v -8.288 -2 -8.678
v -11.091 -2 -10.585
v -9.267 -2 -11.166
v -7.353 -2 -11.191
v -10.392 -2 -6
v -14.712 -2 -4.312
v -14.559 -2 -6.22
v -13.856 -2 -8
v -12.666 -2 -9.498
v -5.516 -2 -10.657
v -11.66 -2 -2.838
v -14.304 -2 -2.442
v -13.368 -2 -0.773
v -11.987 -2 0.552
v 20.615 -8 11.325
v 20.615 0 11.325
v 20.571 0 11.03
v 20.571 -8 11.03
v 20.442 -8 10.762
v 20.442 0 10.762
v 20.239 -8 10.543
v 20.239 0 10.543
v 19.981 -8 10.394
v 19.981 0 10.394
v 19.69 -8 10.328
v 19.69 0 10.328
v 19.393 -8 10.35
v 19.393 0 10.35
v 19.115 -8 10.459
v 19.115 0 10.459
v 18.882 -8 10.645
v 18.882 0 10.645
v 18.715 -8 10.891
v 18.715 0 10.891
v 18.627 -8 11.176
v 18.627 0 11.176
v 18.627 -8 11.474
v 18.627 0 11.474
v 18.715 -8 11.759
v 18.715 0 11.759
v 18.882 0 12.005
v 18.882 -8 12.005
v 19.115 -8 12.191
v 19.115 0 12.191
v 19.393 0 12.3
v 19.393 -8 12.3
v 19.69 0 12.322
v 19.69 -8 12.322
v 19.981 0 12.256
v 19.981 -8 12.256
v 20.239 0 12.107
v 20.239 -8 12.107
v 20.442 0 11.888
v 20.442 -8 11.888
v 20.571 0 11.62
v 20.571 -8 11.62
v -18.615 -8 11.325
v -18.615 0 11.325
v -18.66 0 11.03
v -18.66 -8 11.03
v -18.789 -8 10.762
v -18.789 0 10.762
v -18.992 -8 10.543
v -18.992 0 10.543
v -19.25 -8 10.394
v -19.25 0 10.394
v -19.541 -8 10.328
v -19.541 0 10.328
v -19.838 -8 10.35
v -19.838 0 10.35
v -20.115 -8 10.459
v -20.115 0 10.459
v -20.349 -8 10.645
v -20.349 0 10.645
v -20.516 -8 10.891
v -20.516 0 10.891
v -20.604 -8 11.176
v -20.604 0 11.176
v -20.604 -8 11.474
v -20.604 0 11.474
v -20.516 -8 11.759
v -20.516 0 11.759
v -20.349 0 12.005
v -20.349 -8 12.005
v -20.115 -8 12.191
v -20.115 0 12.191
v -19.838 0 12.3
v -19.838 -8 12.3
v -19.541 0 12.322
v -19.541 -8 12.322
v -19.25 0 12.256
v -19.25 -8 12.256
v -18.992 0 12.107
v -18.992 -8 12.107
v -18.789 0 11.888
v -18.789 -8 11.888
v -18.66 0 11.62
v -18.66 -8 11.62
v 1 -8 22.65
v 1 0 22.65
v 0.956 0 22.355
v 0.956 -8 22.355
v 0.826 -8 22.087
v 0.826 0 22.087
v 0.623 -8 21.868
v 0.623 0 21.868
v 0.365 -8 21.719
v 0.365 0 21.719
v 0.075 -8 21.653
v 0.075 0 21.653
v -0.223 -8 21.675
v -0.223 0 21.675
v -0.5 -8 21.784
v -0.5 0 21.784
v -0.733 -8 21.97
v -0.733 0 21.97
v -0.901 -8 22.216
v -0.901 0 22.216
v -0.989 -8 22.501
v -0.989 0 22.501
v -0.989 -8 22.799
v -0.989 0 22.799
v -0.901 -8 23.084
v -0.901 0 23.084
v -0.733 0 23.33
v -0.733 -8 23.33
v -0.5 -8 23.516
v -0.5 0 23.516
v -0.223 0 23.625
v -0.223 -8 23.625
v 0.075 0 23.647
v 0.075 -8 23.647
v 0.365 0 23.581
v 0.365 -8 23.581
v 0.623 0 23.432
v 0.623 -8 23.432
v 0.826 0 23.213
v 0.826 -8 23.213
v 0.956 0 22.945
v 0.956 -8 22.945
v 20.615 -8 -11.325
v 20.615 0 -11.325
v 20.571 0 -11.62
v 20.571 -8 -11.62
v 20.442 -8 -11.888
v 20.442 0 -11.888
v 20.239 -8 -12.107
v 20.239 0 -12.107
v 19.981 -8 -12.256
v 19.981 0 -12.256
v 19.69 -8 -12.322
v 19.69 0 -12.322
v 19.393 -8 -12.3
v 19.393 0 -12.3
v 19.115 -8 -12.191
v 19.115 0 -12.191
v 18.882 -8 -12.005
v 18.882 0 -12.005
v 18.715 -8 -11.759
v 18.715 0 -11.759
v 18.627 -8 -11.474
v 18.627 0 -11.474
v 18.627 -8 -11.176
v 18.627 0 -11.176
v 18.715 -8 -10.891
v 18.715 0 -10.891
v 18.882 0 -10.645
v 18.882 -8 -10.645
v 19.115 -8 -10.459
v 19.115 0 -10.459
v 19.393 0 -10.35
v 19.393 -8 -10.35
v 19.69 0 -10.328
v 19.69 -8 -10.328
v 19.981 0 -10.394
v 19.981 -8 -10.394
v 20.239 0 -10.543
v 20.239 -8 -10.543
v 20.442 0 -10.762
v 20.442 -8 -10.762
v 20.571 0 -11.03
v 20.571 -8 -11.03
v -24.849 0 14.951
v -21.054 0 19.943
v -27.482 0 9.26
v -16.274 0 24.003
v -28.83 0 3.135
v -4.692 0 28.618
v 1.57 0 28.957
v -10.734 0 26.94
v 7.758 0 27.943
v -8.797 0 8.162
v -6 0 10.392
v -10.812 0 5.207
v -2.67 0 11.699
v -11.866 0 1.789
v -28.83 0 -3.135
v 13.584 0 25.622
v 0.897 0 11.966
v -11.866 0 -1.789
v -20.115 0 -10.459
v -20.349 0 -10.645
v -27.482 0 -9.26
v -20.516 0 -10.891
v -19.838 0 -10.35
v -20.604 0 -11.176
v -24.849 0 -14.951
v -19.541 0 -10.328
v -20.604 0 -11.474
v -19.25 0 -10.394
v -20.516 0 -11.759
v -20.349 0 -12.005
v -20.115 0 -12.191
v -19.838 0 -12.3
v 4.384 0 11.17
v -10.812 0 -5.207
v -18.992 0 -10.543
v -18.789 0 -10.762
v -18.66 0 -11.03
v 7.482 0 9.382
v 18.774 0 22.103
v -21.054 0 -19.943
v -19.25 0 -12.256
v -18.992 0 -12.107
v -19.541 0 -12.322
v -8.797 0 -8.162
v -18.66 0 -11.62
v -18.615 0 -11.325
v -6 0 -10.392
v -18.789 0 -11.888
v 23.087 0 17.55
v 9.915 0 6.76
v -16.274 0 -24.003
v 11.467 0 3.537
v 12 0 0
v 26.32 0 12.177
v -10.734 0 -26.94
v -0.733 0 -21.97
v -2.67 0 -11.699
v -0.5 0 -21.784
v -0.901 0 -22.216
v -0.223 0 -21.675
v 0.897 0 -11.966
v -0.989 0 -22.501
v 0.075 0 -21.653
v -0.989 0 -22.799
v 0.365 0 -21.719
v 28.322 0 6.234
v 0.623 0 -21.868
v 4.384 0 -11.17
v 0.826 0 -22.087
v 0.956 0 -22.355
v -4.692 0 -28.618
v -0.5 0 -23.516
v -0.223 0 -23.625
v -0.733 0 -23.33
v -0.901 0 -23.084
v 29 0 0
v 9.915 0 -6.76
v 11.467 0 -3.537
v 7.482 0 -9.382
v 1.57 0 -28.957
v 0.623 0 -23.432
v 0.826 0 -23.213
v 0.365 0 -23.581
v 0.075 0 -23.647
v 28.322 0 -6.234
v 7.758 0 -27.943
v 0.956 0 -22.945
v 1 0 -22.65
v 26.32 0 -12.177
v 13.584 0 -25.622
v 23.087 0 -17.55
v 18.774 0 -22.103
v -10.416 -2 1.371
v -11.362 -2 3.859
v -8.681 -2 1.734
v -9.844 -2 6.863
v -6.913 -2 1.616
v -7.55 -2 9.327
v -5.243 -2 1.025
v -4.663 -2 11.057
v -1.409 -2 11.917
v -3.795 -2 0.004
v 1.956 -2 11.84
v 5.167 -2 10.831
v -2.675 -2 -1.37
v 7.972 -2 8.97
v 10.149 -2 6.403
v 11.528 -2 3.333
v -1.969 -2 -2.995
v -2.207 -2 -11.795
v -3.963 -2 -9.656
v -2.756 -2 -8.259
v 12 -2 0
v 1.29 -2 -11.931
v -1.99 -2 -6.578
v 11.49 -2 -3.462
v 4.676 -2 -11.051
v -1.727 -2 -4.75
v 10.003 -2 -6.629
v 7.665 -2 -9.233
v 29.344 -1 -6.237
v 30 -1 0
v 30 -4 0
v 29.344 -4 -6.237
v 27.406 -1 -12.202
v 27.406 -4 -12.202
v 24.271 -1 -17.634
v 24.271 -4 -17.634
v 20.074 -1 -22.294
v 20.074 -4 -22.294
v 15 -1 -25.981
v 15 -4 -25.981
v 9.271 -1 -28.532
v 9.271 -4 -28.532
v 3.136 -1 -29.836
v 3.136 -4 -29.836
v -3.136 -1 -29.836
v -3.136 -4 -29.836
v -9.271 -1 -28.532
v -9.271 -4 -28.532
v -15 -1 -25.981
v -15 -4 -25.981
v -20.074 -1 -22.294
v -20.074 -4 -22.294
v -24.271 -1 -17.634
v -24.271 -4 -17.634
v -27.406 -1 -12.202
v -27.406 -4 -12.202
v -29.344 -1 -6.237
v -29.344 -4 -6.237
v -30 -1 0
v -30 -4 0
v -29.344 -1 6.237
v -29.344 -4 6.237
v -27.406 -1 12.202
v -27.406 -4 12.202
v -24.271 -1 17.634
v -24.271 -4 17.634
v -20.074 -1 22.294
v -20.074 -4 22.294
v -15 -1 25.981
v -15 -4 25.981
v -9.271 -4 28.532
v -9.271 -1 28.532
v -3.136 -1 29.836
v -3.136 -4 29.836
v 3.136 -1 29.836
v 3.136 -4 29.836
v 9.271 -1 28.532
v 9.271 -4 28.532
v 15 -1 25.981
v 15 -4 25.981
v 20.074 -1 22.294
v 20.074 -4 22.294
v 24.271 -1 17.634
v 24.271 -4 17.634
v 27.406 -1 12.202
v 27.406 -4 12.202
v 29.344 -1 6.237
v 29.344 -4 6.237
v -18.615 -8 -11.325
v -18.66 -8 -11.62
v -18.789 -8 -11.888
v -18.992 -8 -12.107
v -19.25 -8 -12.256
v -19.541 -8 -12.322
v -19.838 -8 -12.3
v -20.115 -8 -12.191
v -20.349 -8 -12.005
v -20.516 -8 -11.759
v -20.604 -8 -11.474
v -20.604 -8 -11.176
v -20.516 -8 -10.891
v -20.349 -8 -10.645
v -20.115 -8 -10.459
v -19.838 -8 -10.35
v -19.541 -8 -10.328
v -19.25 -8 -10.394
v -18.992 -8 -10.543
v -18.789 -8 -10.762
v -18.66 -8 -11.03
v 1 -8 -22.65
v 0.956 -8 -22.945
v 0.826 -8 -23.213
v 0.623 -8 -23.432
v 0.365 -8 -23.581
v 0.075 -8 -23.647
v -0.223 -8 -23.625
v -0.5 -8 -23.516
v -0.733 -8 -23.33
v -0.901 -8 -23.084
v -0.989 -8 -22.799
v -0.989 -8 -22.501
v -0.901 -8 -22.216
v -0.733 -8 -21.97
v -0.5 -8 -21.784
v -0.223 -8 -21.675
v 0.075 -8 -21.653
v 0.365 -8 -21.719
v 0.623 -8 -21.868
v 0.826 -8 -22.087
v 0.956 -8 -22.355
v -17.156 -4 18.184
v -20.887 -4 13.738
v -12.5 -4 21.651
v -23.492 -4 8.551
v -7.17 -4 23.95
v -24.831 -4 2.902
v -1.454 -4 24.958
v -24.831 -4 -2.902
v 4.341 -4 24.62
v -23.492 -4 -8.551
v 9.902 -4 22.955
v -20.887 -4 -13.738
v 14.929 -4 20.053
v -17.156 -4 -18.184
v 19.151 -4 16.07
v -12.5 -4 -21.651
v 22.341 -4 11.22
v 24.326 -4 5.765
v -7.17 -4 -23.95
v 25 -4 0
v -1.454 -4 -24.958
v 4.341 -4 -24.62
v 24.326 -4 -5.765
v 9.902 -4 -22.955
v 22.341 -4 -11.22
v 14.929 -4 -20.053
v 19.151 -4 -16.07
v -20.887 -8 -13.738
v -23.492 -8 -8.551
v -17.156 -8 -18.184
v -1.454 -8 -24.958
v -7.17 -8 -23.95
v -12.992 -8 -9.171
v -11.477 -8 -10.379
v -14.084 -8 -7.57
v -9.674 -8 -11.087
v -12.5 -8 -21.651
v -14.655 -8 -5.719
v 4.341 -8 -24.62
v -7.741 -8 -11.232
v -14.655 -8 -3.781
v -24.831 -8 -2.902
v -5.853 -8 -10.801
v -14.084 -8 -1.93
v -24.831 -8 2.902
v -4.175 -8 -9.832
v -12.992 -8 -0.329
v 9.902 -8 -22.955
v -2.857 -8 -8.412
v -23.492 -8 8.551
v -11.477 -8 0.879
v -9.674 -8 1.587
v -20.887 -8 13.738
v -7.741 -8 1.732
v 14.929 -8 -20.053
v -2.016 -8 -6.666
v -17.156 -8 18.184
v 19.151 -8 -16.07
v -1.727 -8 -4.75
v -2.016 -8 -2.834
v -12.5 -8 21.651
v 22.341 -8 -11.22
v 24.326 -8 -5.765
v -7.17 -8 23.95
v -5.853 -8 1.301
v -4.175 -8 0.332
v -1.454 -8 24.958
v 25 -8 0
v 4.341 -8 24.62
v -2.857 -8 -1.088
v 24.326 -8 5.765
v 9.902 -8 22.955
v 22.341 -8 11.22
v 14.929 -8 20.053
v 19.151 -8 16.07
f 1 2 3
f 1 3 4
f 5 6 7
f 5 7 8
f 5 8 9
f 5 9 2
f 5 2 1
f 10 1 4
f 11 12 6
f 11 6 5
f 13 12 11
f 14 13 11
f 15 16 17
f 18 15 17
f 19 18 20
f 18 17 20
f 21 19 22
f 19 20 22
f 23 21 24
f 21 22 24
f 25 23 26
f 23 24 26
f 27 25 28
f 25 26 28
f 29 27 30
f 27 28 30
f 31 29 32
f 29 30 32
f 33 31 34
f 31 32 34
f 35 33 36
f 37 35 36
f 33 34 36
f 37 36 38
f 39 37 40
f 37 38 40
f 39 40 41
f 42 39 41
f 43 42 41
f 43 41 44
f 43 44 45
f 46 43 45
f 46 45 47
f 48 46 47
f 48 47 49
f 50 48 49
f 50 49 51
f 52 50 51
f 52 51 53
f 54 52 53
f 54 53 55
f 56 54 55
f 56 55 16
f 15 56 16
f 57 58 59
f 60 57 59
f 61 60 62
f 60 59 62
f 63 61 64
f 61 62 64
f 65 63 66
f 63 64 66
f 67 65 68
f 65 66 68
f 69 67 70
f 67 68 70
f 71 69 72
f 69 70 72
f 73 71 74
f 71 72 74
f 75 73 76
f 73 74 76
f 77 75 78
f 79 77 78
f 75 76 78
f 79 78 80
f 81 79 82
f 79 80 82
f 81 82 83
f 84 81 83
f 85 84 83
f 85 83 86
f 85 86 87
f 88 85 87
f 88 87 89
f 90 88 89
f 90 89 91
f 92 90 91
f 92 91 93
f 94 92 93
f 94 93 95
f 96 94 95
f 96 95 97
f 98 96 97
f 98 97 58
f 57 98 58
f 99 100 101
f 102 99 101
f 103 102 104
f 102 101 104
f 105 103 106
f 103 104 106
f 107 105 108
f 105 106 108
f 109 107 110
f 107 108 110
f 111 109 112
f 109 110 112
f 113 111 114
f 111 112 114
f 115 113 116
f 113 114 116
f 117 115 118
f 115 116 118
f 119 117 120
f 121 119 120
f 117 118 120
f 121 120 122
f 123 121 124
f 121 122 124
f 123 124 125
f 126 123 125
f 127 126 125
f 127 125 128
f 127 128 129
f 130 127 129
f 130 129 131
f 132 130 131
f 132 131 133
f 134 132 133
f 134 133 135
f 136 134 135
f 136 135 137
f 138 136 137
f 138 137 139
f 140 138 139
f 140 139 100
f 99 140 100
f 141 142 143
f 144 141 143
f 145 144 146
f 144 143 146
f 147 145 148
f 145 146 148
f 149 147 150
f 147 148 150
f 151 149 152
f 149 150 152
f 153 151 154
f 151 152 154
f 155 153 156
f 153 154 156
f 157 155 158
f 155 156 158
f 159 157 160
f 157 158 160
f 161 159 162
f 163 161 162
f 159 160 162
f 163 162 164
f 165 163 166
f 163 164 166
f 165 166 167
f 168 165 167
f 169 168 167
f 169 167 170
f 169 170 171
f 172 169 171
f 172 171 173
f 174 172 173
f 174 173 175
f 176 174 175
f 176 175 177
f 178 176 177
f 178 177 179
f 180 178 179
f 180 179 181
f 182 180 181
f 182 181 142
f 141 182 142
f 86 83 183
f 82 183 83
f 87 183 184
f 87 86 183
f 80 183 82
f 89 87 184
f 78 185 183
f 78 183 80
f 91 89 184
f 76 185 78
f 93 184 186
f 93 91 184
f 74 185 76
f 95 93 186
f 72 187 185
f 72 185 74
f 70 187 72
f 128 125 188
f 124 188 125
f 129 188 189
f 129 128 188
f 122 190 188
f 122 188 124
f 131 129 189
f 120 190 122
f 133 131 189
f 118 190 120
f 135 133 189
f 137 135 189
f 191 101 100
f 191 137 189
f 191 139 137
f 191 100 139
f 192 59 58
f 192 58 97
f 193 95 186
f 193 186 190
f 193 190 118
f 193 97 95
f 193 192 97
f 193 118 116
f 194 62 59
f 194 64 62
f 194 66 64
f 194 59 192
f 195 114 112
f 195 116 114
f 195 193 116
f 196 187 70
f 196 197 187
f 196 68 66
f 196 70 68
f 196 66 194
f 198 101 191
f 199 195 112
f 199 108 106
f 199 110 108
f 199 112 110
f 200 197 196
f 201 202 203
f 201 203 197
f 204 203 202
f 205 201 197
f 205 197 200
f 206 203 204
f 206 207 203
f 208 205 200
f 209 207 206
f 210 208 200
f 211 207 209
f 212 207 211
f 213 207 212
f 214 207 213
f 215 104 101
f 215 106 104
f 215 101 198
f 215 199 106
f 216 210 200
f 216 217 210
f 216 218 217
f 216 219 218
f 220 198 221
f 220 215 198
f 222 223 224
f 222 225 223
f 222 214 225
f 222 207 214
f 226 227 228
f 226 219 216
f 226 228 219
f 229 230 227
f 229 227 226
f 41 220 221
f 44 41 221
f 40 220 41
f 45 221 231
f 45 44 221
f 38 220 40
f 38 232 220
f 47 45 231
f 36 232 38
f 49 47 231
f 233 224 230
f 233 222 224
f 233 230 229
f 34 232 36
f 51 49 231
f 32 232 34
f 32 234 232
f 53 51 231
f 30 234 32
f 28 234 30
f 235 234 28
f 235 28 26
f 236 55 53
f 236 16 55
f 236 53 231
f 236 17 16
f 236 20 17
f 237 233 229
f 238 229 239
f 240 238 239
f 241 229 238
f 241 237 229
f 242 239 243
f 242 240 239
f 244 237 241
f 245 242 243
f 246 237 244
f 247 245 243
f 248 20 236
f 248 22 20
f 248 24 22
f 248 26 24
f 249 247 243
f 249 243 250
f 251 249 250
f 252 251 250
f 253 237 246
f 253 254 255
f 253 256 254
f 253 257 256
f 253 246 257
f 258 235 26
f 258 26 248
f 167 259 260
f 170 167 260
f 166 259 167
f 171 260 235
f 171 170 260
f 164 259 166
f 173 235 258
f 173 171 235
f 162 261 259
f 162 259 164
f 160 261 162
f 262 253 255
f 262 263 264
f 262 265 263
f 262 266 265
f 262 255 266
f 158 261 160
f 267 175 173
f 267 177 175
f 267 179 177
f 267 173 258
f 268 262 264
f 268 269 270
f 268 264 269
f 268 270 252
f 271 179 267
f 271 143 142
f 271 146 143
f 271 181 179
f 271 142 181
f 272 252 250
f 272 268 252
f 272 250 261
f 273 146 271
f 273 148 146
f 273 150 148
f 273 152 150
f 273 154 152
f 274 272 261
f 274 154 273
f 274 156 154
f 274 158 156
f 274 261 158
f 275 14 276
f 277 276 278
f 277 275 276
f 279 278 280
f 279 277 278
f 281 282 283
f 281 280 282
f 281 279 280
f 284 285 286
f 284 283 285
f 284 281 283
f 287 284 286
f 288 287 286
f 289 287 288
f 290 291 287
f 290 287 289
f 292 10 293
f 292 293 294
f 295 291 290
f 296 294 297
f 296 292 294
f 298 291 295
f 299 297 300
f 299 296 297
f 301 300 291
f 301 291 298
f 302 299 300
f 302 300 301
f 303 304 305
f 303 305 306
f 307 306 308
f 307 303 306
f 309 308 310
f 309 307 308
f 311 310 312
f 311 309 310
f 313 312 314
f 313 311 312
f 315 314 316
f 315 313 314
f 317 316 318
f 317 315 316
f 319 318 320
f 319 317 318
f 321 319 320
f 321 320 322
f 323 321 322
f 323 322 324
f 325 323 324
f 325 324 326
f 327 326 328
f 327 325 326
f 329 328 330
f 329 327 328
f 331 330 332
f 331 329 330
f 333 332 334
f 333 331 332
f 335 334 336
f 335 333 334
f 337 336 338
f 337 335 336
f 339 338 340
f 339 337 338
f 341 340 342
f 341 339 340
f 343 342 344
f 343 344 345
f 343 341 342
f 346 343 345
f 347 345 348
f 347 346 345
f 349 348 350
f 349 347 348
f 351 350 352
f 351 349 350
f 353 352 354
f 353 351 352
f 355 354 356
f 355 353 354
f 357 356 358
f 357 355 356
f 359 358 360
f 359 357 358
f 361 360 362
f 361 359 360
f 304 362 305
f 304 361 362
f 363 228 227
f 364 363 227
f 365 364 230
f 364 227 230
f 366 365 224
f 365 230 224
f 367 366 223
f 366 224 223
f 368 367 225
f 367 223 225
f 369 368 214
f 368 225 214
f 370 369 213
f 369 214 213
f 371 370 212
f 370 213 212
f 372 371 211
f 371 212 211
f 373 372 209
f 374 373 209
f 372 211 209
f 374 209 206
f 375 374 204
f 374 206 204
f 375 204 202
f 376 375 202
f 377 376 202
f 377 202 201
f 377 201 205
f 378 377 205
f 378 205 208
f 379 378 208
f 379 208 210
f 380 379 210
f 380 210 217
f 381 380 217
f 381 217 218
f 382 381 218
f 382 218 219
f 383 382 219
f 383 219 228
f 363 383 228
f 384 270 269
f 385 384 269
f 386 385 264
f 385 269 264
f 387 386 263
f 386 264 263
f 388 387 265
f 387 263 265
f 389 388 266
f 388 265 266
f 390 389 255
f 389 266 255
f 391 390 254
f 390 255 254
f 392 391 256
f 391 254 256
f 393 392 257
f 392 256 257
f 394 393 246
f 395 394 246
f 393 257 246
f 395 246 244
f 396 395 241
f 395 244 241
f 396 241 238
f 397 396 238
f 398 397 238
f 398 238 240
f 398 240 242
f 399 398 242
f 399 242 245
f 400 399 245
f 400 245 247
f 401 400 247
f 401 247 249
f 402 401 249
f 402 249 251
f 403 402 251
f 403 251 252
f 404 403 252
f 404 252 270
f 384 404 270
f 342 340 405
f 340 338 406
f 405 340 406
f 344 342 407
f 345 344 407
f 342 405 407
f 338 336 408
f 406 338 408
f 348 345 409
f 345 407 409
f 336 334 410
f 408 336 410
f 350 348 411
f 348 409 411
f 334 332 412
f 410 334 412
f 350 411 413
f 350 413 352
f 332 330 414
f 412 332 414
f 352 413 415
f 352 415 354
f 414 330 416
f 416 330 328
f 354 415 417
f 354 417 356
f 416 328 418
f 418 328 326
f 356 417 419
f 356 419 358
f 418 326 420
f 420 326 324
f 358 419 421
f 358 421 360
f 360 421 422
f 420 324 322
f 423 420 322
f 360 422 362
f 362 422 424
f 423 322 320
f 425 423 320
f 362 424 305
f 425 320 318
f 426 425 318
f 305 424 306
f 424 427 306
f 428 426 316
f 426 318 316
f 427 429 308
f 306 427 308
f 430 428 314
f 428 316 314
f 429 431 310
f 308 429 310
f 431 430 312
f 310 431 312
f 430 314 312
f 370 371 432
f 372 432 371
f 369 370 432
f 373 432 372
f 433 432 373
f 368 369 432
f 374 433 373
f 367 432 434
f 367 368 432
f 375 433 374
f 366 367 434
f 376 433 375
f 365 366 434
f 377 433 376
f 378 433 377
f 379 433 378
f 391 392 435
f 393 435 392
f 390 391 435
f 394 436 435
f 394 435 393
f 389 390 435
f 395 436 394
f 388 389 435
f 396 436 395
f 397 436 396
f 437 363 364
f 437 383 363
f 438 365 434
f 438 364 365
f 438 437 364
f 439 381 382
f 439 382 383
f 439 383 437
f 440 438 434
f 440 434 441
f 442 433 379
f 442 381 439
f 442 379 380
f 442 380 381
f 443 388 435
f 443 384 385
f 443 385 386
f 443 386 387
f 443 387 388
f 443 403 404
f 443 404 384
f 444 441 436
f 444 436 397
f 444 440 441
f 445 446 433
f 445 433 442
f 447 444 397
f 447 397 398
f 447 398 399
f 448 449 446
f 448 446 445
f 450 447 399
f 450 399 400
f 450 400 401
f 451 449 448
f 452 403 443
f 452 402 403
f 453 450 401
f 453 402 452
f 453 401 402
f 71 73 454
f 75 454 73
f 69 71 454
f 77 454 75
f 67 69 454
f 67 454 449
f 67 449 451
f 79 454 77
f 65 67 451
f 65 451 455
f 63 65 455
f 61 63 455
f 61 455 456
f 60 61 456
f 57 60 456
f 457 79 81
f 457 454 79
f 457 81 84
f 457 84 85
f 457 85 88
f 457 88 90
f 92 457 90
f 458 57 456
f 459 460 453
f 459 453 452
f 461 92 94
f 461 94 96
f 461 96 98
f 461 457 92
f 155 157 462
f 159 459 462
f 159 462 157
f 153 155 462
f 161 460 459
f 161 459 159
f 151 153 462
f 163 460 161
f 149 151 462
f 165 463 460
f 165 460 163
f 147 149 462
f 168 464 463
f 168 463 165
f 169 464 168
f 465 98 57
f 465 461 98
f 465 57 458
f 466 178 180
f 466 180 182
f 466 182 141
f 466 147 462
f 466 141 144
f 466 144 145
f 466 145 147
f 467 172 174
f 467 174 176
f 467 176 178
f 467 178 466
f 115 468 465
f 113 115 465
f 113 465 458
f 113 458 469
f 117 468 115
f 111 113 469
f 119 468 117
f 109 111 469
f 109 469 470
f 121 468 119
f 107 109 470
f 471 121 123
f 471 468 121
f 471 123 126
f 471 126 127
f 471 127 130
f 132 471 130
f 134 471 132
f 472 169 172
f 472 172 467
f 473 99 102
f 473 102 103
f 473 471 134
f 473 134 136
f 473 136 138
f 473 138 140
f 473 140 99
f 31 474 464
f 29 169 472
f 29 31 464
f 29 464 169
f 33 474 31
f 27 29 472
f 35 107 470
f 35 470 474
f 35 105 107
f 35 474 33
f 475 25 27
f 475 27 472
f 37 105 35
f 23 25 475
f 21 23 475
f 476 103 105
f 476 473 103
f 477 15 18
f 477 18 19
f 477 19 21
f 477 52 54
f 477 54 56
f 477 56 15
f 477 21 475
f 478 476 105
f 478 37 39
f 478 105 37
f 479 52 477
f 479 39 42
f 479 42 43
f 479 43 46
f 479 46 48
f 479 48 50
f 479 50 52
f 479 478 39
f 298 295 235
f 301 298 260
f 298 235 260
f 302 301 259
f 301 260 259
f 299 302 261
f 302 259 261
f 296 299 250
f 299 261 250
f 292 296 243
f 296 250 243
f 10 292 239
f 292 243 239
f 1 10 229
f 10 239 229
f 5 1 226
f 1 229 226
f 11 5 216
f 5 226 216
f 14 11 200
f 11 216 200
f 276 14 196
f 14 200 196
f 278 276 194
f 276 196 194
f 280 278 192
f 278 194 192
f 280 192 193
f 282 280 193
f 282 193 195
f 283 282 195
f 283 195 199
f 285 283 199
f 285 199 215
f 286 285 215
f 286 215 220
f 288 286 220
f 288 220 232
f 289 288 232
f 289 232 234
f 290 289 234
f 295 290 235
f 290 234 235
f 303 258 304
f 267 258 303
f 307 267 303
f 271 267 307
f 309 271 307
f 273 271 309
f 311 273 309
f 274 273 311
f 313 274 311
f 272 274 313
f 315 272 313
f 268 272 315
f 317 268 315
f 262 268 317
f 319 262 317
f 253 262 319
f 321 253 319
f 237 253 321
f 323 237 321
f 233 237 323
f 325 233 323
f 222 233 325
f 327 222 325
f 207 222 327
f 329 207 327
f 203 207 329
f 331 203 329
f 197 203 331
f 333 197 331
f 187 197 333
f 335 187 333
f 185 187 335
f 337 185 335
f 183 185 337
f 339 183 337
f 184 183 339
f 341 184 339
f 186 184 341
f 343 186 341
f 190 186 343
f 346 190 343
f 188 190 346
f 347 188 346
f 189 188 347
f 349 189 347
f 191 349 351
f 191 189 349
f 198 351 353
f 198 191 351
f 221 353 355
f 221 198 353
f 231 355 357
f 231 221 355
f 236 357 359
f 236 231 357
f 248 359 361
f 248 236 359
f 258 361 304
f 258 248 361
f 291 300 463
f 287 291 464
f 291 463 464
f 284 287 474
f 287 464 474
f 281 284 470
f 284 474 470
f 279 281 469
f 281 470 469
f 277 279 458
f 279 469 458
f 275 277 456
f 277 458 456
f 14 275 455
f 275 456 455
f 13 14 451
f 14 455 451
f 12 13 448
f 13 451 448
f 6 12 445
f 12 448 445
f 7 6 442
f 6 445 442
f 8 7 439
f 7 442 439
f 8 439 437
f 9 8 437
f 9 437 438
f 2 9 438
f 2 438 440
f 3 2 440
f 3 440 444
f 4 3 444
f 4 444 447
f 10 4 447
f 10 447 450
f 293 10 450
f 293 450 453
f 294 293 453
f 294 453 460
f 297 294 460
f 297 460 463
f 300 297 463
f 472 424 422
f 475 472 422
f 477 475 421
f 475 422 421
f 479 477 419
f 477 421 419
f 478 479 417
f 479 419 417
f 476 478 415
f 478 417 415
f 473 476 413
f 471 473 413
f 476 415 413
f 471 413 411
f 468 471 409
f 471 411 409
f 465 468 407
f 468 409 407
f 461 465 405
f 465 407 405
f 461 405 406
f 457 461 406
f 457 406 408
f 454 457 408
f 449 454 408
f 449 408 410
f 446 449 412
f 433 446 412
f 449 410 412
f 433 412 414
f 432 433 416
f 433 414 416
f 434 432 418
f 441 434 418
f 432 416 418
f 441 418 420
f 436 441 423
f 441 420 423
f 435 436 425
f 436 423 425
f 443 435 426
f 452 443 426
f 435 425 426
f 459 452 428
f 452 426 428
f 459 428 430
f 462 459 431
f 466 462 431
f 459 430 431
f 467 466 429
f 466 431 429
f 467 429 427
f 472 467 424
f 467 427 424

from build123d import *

# Parameters (mm, degrees)
SKETCH_1_R          = 30
EXTRUDE_1_DEPTH     = 4
SKETCH_2_R          = 25
EXTRUDE_2_DEPTH     = 4
SKETCH_3_R          = 12
CUT_EXTRUDE_1_DEPTH = 2
SKETCH_4_R          = 6.5
CUT_EXTRUDE_2_DEPTH = 6
CHAMFER_1_SIZE      = 1
CUT_EXTRUDE_3_REACH = 10
SKETCH_5_R          = 1
SKETCH_6_R          = 6.5
EXTRUDE_4_DEPTH     = 6
SKETCH_9_R          = 6.5
CUT_EXTRUDE_5_DEPTH = 6


with BuildPart() as part:
    # ｽｹｯﾁ1 → ﾎﾞｽ - 押し出し1 (new body)
    with BuildSketch(Plane(origin=(0, 0, 0), x_dir=(1, 0, 0), z_dir=(0, 1, 0))):
        Circle(SKETCH_1_R)
    extrude(amount=-EXTRUDE_1_DEPTH)

    # ｽｹｯﾁ2 → ﾎﾞｽ - 押し出し2 (add)
    with BuildSketch(Plane.XZ.offset(4)):
        Circle(SKETCH_2_R)
    extrude(amount=EXTRUDE_2_DEPTH)

    # ｽｹｯﾁ3 → ｶｯﾄ - 押し出し1 (cut)
    with BuildSketch(Plane(origin=(0, 0, 0), x_dir=(1, 0, 0), z_dir=(0, 1, 0))):
        Circle(SKETCH_3_R)
    extrude(amount=-CUT_EXTRUDE_1_DEPTH, mode=Mode.SUBTRACT)

    # ｽｹｯﾁ4 → ｶｯﾄ - 押し出し2 (cut)
    with BuildSketch(Plane.XZ.offset(8)):
        with Locations((0, -14.5)):
            Circle(SKETCH_4_R)
    extrude(amount=-CUT_EXTRUDE_2_DEPTH, mode=Mode.SUBTRACT)

    # 面取り1
    chamfer_1_edges = [part.edges().sort_by_distance(p)[0] for p in [
        (-30, 0, 0),
    ]]
    chamfer(chamfer_1_edges, length=CHAMFER_1_SIZE)

    # ｽｹｯﾁ5 → ｶｯﾄ - 押し出し3 (cut, up to next)
    with BuildSketch(Plane(origin=(0, 0, 0), x_dir=(1, 0, 0), z_dir=(0, 1, 0)), mode=Mode.PRIVATE) as cut_extrude_3_sk1:
        with Locations((0, -22.65)):
            Circle(SKETCH_5_R)
    cut_extrude_3_tool1 = extrude(cut_extrude_3_sk1.sketch, amount=-CUT_EXTRUDE_3_REACH, mode=Mode.PRIVATE) & part.part
    add(cut_extrude_3_tool1.solids().sort_by_distance((0, 0, 22.65))[0], mode=Mode.SUBTRACT)
    # ｽｹｯﾁ5 → ｶｯﾄ - 押し出し3 (cut, up to next)
    with BuildSketch(Plane(origin=(0, 0, 0), x_dir=(1, 0, 0), z_dir=(0, 1, 0)), mode=Mode.PRIVATE) as cut_extrude_3_sk2:
        with Locations((-19.615475396, -11.325)):
            Circle(SKETCH_5_R)
    cut_extrude_3_tool2 = extrude(cut_extrude_3_sk2.sketch, amount=-CUT_EXTRUDE_3_REACH, mode=Mode.PRIVATE) & part.part
    add(cut_extrude_3_tool2.solids().sort_by_distance((-19.615475, 0, 11.325))[0], mode=Mode.SUBTRACT)
    # ｽｹｯﾁ5 → ｶｯﾄ - 押し出し3 (cut, up to next)
    with BuildSketch(Plane(origin=(0, 0, 0), x_dir=(1, 0, 0), z_dir=(0, 1, 0)), mode=Mode.PRIVATE) as cut_extrude_3_sk3:
        with Locations((-19.615475396, 11.325)):
            Circle(SKETCH_5_R)
    cut_extrude_3_tool3 = extrude(cut_extrude_3_sk3.sketch, amount=-CUT_EXTRUDE_3_REACH, mode=Mode.PRIVATE) & part.part
    add(cut_extrude_3_tool3.solids().sort_by_distance((-19.615475, 0, -11.325))[0], mode=Mode.SUBTRACT)
    # ｽｹｯﾁ5 → ｶｯﾄ - 押し出し3 (cut, up to next)
    with BuildSketch(Plane(origin=(0, 0, 0), x_dir=(1, 0, 0), z_dir=(0, 1, 0)), mode=Mode.PRIVATE) as cut_extrude_3_sk4:
        with Locations((0, 22.65)):
            Circle(SKETCH_5_R)
    cut_extrude_3_tool4 = extrude(cut_extrude_3_sk4.sketch, amount=-CUT_EXTRUDE_3_REACH, mode=Mode.PRIVATE) & part.part
    add(cut_extrude_3_tool4.solids().sort_by_distance((0, 0, -22.65))[0], mode=Mode.SUBTRACT)
    # ｽｹｯﾁ5 → ｶｯﾄ - 押し出し3 (cut, up to next)
    with BuildSketch(Plane(origin=(0, 0, 0), x_dir=(1, 0, 0), z_dir=(0, 1, 0)), mode=Mode.PRIVATE) as cut_extrude_3_sk5:
        with Locations((19.615475396, 11.325)):
            Circle(SKETCH_5_R)
    cut_extrude_3_tool5 = extrude(cut_extrude_3_sk5.sketch, amount=-CUT_EXTRUDE_3_REACH, mode=Mode.PRIVATE) & part.part
    add(cut_extrude_3_tool5.solids().sort_by_distance((19.615475, 0, -11.325))[0], mode=Mode.SUBTRACT)
    # ｽｹｯﾁ5 → ｶｯﾄ - 押し出し3 (cut, up to next)
    with BuildSketch(Plane(origin=(0, 0, 0), x_dir=(1, 0, 0), z_dir=(0, 1, 0)), mode=Mode.PRIVATE) as cut_extrude_3_sk6:
        with Locations((19.615475396, -11.325)):
            Circle(SKETCH_5_R)
    cut_extrude_3_tool6 = extrude(cut_extrude_3_sk6.sketch, amount=-CUT_EXTRUDE_3_REACH, mode=Mode.PRIVATE) & part.part
    add(cut_extrude_3_tool6.solids().sort_by_distance((19.615475, 0, 11.325))[0], mode=Mode.SUBTRACT)

    # ｽｹｯﾁ6 → ﾎﾞｽ - 押し出し4 (add)
    with BuildSketch(Plane.XZ.offset(8)):
        with Locations((0, -14.5)):
            Circle(SKETCH_6_R)
    extrude(amount=-EXTRUDE_4_DEPTH)

    # ｽｹｯﾁ9 → ｶｯﾄ - 押し出し5 (cut)
    with BuildSketch(Plane.XZ.offset(8)):
        with Locations((-8.227241336, -4.75)):
            Circle(SKETCH_9_R)
    extrude(amount=-CUT_EXTRUDE_5_DEPTH, mode=Mode.SUBTRACT)


solid = part.part
